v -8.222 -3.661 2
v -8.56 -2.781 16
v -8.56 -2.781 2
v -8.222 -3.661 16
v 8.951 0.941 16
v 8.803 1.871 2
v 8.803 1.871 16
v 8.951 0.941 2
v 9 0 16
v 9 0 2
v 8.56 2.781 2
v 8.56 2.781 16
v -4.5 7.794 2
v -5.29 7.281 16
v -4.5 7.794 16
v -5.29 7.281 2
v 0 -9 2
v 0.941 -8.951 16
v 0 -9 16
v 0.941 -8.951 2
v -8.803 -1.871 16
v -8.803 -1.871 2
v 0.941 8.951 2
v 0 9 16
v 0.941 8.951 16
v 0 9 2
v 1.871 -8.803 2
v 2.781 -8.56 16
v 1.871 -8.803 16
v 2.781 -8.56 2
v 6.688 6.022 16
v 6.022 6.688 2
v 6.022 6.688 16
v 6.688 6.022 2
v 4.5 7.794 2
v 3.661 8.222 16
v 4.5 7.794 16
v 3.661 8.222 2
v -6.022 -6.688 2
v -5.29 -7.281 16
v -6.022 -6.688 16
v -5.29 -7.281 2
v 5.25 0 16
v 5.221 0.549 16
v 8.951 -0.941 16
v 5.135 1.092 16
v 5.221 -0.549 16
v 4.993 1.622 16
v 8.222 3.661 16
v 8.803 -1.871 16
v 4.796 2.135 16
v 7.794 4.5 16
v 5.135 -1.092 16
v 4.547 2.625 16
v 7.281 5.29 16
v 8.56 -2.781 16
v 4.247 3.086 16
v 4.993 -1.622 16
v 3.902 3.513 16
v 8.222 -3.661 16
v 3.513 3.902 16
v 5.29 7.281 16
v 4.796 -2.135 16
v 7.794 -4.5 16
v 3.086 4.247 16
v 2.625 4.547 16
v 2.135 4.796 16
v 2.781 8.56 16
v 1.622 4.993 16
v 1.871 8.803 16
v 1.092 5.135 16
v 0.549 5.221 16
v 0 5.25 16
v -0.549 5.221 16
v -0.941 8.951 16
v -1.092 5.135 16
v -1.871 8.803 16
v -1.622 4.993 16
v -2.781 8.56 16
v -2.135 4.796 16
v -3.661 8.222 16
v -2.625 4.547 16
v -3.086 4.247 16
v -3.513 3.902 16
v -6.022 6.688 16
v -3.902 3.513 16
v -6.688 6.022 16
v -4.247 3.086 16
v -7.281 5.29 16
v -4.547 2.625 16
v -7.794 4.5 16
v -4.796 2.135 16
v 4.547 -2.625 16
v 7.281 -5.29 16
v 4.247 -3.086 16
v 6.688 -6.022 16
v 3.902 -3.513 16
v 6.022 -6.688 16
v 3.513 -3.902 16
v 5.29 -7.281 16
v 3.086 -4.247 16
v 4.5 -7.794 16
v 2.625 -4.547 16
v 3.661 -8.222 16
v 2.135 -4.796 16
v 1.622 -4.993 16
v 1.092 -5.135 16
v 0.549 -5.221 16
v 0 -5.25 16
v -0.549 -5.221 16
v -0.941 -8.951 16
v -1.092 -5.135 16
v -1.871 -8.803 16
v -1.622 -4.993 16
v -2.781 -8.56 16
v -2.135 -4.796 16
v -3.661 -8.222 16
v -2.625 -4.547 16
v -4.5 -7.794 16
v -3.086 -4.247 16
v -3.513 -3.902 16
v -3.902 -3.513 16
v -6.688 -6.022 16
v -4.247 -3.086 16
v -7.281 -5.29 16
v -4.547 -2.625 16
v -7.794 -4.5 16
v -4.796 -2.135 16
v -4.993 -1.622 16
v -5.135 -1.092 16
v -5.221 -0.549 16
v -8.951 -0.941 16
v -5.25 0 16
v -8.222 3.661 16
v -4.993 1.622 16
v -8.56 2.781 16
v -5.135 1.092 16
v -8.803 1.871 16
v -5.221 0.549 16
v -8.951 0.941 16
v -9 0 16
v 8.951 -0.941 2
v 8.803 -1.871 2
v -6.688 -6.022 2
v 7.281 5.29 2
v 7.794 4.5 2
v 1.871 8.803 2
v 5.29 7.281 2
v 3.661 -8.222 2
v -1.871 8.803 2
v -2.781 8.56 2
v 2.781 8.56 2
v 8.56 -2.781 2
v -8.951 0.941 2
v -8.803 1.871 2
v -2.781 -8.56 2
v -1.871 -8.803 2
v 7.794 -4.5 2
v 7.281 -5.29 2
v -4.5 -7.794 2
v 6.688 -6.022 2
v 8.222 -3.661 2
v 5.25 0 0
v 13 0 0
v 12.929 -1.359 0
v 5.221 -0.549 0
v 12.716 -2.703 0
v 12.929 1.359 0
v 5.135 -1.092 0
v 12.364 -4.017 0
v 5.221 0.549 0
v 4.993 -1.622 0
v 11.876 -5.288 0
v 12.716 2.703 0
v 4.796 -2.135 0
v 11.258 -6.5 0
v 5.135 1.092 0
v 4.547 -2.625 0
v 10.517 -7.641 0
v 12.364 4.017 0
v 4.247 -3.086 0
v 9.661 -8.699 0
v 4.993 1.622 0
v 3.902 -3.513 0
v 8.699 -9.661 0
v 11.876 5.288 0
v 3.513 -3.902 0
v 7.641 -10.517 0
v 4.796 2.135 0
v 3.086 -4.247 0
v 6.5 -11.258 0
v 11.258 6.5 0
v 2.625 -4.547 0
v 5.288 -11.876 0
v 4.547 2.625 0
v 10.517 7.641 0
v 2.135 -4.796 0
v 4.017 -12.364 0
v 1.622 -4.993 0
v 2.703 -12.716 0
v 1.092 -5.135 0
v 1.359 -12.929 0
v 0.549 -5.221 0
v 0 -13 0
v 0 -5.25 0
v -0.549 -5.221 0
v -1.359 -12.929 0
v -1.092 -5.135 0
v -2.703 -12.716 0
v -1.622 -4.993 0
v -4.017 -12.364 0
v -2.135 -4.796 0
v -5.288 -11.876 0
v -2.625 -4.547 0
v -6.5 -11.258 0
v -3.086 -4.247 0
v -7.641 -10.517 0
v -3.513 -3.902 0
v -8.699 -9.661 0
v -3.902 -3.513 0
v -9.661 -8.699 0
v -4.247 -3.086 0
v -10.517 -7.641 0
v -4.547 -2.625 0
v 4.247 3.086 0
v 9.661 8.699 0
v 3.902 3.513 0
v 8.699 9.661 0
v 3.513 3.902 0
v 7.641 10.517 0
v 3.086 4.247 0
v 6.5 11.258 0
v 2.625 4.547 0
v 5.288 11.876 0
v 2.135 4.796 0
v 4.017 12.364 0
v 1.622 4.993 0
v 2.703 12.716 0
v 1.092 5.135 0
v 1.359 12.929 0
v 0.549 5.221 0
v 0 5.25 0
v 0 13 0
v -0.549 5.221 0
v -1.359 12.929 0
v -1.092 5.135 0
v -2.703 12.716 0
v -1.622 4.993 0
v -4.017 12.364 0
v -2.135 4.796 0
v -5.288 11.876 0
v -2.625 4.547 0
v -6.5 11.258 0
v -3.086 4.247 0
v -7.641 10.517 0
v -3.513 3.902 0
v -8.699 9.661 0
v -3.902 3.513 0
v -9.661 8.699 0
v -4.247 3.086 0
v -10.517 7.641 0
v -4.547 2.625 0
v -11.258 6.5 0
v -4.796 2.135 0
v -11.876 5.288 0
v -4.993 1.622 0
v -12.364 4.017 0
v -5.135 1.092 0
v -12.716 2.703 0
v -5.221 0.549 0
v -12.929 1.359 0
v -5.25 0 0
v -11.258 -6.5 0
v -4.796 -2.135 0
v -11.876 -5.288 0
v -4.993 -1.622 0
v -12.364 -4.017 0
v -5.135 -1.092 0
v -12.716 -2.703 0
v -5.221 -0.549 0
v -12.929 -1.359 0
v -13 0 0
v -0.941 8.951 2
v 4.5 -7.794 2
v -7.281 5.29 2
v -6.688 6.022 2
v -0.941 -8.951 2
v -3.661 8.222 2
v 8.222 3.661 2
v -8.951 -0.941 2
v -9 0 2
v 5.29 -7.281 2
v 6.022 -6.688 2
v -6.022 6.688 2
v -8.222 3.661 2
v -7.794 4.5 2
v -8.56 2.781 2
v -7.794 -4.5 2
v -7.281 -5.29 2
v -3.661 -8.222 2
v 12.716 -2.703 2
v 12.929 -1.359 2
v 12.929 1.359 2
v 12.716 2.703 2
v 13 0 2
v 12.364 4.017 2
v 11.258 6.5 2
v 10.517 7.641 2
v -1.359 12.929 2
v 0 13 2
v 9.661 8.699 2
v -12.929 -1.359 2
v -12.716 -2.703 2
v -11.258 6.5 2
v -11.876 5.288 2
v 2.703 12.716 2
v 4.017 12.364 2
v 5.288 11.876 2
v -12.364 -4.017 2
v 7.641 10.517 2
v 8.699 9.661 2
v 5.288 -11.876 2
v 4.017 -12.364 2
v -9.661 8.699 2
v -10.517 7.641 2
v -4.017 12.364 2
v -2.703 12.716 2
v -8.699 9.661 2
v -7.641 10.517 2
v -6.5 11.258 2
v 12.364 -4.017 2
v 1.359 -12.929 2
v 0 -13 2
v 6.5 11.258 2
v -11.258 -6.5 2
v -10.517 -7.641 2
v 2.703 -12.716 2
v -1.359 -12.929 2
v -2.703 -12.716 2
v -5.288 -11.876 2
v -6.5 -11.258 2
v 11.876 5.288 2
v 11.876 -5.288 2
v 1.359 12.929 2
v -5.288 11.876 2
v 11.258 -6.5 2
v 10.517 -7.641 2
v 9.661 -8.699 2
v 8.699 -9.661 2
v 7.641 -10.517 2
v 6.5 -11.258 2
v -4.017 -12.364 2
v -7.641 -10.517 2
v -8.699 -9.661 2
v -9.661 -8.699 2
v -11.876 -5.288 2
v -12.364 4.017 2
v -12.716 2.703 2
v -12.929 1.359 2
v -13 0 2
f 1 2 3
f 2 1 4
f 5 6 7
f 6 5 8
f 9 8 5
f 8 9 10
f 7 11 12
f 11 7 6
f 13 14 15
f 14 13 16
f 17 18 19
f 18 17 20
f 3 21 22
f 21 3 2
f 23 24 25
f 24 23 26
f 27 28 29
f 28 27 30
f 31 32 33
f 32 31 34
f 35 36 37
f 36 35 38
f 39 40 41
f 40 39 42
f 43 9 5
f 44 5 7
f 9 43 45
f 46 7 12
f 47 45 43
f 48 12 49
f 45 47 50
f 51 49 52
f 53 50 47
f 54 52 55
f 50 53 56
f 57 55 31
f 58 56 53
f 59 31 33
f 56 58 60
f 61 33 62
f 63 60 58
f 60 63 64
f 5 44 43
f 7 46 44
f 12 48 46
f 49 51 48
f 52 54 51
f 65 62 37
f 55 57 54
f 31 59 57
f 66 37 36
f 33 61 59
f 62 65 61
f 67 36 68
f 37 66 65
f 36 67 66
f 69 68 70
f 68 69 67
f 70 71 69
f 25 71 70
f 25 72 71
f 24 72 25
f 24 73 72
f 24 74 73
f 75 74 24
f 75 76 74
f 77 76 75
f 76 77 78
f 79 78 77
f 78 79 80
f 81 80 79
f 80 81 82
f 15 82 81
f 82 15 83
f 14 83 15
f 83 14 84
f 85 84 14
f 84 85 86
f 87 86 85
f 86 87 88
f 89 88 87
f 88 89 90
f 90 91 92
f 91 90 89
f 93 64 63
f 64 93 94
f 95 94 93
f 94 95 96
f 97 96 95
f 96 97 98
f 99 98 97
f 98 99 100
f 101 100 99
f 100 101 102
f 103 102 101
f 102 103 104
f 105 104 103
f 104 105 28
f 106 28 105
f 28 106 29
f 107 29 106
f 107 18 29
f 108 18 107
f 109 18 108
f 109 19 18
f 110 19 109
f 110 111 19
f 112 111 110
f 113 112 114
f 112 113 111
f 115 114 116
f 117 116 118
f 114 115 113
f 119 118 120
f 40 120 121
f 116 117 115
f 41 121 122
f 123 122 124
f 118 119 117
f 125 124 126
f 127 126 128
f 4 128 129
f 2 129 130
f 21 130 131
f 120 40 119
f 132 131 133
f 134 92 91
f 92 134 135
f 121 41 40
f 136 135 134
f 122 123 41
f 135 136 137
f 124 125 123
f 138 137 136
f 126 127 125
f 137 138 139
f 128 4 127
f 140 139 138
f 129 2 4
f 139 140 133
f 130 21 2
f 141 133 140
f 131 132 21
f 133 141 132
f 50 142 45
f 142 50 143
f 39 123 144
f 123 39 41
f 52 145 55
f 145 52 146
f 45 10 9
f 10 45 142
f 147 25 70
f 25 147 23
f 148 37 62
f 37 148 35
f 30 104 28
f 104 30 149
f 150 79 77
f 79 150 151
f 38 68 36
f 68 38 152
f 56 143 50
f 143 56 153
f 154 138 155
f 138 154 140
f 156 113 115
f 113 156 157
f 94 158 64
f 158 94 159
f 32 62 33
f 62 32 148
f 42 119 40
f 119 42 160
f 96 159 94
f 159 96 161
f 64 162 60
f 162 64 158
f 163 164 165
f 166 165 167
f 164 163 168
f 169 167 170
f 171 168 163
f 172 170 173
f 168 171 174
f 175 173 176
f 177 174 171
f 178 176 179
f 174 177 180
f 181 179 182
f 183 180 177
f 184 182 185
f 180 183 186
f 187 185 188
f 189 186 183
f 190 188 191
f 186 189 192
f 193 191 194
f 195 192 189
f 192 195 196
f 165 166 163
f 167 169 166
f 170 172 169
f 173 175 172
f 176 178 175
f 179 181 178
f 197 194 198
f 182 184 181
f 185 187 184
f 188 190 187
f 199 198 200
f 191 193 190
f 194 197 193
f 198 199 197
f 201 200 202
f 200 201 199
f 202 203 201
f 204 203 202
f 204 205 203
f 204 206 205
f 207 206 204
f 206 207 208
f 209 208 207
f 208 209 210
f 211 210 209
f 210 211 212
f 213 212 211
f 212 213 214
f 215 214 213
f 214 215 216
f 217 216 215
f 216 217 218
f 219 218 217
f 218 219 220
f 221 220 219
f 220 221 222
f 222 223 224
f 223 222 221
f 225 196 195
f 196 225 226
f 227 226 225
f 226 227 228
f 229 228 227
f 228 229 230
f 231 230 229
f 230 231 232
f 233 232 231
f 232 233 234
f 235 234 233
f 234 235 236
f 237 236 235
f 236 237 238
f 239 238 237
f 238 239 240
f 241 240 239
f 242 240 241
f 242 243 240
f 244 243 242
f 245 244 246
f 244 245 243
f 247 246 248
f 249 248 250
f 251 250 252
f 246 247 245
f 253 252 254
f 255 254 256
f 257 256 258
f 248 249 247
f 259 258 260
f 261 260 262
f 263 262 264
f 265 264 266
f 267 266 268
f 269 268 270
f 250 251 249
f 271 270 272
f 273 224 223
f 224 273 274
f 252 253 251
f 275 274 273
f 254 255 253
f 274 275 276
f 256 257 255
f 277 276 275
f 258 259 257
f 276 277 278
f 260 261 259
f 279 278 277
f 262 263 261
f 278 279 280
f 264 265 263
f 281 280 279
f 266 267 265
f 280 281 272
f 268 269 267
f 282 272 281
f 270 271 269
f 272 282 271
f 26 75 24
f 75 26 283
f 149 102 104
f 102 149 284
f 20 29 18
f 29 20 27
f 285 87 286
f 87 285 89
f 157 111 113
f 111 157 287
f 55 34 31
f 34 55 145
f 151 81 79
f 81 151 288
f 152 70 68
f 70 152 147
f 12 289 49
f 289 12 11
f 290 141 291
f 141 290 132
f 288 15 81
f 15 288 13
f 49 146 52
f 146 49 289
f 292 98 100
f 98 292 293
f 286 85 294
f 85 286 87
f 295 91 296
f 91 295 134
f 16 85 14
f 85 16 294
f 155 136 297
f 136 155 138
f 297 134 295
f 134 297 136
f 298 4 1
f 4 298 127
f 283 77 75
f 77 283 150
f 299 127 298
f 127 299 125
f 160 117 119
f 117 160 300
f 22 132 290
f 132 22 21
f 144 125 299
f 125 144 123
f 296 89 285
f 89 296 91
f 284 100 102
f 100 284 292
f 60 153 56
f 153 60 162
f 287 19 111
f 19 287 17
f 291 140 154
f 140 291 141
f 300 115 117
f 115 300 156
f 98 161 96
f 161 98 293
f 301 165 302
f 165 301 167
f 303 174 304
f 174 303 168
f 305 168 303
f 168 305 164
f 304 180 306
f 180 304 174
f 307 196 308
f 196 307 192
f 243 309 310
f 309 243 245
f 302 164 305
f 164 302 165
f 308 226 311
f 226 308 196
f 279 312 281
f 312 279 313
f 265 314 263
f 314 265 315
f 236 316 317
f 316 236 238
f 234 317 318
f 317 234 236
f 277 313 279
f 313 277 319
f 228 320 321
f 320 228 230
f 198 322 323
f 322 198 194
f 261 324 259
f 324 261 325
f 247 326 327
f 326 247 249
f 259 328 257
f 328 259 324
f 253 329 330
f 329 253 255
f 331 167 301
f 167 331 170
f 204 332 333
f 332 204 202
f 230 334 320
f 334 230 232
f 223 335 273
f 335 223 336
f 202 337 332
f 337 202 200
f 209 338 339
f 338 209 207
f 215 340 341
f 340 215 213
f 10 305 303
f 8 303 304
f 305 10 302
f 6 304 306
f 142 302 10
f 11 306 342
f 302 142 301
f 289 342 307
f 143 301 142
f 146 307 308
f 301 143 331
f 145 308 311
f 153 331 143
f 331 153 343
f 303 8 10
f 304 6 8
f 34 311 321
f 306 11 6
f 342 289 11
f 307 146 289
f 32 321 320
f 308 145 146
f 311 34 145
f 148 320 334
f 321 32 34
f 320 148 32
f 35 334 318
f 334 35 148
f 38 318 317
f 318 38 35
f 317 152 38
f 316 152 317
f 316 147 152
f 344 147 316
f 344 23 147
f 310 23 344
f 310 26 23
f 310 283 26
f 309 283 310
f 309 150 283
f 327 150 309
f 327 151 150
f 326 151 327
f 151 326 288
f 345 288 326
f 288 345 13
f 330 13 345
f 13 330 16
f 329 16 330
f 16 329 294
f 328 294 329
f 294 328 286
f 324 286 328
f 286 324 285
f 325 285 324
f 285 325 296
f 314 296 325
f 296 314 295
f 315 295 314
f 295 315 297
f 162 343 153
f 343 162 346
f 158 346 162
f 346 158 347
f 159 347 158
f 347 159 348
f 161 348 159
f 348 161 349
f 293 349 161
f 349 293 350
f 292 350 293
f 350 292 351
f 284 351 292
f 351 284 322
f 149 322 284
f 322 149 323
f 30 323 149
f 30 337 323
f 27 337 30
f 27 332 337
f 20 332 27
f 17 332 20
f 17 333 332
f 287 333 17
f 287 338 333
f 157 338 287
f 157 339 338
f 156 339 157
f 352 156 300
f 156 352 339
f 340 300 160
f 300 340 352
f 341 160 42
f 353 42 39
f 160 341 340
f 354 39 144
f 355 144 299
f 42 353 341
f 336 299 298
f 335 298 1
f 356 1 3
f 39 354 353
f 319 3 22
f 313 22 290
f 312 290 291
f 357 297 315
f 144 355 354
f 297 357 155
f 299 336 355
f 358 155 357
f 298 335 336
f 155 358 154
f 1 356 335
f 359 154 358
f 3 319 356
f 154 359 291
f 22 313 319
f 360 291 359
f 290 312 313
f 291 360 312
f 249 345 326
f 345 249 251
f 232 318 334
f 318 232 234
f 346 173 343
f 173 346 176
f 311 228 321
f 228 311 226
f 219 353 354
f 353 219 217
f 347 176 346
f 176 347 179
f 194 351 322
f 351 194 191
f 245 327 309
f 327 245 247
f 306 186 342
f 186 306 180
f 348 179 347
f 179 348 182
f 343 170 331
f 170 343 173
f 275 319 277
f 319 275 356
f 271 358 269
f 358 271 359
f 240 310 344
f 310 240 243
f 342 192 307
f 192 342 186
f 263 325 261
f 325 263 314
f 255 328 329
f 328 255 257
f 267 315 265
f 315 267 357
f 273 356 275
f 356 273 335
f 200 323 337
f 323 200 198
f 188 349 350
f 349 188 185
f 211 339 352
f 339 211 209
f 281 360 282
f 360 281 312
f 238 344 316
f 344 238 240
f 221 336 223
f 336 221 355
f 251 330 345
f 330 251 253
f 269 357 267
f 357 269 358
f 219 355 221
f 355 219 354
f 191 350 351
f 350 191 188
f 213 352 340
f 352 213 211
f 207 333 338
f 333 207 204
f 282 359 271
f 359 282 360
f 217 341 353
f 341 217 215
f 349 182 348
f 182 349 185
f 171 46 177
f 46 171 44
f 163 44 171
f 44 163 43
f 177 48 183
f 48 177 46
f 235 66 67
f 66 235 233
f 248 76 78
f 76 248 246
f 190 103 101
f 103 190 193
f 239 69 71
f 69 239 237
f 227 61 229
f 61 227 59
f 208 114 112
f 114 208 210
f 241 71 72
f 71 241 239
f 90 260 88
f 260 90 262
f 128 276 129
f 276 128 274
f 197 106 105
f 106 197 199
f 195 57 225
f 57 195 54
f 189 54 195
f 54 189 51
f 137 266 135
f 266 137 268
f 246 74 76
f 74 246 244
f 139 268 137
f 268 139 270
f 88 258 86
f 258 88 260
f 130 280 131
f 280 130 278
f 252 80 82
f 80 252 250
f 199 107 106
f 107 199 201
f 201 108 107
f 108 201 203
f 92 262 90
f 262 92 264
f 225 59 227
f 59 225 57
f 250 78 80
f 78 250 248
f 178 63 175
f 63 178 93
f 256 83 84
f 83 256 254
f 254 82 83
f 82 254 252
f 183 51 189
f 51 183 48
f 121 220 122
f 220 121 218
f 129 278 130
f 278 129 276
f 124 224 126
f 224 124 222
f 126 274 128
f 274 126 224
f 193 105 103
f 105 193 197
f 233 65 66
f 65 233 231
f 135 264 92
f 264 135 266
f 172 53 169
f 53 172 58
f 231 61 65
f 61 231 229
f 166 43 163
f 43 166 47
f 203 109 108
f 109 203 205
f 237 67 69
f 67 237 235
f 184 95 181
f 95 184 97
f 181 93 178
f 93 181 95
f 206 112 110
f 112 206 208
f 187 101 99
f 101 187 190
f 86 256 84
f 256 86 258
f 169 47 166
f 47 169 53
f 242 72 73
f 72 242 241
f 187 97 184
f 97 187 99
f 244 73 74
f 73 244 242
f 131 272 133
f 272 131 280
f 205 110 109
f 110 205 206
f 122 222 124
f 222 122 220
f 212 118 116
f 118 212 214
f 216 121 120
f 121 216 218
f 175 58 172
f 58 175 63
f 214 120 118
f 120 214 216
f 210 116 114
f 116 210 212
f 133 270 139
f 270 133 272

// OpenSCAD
// Flanged threaded insert.
$fn = 60;
eps = 0.02;
inner_d = 10.5;
outer_d = 18;
length = 16;
flange_d = 26;
difference() {
    union() { cylinder(d=outer_d,h=length); cylinder(d=flange_d,h=2); }
    translate([0,0,-eps]) cylinder(d=inner_d,h=length+2*eps);
}
